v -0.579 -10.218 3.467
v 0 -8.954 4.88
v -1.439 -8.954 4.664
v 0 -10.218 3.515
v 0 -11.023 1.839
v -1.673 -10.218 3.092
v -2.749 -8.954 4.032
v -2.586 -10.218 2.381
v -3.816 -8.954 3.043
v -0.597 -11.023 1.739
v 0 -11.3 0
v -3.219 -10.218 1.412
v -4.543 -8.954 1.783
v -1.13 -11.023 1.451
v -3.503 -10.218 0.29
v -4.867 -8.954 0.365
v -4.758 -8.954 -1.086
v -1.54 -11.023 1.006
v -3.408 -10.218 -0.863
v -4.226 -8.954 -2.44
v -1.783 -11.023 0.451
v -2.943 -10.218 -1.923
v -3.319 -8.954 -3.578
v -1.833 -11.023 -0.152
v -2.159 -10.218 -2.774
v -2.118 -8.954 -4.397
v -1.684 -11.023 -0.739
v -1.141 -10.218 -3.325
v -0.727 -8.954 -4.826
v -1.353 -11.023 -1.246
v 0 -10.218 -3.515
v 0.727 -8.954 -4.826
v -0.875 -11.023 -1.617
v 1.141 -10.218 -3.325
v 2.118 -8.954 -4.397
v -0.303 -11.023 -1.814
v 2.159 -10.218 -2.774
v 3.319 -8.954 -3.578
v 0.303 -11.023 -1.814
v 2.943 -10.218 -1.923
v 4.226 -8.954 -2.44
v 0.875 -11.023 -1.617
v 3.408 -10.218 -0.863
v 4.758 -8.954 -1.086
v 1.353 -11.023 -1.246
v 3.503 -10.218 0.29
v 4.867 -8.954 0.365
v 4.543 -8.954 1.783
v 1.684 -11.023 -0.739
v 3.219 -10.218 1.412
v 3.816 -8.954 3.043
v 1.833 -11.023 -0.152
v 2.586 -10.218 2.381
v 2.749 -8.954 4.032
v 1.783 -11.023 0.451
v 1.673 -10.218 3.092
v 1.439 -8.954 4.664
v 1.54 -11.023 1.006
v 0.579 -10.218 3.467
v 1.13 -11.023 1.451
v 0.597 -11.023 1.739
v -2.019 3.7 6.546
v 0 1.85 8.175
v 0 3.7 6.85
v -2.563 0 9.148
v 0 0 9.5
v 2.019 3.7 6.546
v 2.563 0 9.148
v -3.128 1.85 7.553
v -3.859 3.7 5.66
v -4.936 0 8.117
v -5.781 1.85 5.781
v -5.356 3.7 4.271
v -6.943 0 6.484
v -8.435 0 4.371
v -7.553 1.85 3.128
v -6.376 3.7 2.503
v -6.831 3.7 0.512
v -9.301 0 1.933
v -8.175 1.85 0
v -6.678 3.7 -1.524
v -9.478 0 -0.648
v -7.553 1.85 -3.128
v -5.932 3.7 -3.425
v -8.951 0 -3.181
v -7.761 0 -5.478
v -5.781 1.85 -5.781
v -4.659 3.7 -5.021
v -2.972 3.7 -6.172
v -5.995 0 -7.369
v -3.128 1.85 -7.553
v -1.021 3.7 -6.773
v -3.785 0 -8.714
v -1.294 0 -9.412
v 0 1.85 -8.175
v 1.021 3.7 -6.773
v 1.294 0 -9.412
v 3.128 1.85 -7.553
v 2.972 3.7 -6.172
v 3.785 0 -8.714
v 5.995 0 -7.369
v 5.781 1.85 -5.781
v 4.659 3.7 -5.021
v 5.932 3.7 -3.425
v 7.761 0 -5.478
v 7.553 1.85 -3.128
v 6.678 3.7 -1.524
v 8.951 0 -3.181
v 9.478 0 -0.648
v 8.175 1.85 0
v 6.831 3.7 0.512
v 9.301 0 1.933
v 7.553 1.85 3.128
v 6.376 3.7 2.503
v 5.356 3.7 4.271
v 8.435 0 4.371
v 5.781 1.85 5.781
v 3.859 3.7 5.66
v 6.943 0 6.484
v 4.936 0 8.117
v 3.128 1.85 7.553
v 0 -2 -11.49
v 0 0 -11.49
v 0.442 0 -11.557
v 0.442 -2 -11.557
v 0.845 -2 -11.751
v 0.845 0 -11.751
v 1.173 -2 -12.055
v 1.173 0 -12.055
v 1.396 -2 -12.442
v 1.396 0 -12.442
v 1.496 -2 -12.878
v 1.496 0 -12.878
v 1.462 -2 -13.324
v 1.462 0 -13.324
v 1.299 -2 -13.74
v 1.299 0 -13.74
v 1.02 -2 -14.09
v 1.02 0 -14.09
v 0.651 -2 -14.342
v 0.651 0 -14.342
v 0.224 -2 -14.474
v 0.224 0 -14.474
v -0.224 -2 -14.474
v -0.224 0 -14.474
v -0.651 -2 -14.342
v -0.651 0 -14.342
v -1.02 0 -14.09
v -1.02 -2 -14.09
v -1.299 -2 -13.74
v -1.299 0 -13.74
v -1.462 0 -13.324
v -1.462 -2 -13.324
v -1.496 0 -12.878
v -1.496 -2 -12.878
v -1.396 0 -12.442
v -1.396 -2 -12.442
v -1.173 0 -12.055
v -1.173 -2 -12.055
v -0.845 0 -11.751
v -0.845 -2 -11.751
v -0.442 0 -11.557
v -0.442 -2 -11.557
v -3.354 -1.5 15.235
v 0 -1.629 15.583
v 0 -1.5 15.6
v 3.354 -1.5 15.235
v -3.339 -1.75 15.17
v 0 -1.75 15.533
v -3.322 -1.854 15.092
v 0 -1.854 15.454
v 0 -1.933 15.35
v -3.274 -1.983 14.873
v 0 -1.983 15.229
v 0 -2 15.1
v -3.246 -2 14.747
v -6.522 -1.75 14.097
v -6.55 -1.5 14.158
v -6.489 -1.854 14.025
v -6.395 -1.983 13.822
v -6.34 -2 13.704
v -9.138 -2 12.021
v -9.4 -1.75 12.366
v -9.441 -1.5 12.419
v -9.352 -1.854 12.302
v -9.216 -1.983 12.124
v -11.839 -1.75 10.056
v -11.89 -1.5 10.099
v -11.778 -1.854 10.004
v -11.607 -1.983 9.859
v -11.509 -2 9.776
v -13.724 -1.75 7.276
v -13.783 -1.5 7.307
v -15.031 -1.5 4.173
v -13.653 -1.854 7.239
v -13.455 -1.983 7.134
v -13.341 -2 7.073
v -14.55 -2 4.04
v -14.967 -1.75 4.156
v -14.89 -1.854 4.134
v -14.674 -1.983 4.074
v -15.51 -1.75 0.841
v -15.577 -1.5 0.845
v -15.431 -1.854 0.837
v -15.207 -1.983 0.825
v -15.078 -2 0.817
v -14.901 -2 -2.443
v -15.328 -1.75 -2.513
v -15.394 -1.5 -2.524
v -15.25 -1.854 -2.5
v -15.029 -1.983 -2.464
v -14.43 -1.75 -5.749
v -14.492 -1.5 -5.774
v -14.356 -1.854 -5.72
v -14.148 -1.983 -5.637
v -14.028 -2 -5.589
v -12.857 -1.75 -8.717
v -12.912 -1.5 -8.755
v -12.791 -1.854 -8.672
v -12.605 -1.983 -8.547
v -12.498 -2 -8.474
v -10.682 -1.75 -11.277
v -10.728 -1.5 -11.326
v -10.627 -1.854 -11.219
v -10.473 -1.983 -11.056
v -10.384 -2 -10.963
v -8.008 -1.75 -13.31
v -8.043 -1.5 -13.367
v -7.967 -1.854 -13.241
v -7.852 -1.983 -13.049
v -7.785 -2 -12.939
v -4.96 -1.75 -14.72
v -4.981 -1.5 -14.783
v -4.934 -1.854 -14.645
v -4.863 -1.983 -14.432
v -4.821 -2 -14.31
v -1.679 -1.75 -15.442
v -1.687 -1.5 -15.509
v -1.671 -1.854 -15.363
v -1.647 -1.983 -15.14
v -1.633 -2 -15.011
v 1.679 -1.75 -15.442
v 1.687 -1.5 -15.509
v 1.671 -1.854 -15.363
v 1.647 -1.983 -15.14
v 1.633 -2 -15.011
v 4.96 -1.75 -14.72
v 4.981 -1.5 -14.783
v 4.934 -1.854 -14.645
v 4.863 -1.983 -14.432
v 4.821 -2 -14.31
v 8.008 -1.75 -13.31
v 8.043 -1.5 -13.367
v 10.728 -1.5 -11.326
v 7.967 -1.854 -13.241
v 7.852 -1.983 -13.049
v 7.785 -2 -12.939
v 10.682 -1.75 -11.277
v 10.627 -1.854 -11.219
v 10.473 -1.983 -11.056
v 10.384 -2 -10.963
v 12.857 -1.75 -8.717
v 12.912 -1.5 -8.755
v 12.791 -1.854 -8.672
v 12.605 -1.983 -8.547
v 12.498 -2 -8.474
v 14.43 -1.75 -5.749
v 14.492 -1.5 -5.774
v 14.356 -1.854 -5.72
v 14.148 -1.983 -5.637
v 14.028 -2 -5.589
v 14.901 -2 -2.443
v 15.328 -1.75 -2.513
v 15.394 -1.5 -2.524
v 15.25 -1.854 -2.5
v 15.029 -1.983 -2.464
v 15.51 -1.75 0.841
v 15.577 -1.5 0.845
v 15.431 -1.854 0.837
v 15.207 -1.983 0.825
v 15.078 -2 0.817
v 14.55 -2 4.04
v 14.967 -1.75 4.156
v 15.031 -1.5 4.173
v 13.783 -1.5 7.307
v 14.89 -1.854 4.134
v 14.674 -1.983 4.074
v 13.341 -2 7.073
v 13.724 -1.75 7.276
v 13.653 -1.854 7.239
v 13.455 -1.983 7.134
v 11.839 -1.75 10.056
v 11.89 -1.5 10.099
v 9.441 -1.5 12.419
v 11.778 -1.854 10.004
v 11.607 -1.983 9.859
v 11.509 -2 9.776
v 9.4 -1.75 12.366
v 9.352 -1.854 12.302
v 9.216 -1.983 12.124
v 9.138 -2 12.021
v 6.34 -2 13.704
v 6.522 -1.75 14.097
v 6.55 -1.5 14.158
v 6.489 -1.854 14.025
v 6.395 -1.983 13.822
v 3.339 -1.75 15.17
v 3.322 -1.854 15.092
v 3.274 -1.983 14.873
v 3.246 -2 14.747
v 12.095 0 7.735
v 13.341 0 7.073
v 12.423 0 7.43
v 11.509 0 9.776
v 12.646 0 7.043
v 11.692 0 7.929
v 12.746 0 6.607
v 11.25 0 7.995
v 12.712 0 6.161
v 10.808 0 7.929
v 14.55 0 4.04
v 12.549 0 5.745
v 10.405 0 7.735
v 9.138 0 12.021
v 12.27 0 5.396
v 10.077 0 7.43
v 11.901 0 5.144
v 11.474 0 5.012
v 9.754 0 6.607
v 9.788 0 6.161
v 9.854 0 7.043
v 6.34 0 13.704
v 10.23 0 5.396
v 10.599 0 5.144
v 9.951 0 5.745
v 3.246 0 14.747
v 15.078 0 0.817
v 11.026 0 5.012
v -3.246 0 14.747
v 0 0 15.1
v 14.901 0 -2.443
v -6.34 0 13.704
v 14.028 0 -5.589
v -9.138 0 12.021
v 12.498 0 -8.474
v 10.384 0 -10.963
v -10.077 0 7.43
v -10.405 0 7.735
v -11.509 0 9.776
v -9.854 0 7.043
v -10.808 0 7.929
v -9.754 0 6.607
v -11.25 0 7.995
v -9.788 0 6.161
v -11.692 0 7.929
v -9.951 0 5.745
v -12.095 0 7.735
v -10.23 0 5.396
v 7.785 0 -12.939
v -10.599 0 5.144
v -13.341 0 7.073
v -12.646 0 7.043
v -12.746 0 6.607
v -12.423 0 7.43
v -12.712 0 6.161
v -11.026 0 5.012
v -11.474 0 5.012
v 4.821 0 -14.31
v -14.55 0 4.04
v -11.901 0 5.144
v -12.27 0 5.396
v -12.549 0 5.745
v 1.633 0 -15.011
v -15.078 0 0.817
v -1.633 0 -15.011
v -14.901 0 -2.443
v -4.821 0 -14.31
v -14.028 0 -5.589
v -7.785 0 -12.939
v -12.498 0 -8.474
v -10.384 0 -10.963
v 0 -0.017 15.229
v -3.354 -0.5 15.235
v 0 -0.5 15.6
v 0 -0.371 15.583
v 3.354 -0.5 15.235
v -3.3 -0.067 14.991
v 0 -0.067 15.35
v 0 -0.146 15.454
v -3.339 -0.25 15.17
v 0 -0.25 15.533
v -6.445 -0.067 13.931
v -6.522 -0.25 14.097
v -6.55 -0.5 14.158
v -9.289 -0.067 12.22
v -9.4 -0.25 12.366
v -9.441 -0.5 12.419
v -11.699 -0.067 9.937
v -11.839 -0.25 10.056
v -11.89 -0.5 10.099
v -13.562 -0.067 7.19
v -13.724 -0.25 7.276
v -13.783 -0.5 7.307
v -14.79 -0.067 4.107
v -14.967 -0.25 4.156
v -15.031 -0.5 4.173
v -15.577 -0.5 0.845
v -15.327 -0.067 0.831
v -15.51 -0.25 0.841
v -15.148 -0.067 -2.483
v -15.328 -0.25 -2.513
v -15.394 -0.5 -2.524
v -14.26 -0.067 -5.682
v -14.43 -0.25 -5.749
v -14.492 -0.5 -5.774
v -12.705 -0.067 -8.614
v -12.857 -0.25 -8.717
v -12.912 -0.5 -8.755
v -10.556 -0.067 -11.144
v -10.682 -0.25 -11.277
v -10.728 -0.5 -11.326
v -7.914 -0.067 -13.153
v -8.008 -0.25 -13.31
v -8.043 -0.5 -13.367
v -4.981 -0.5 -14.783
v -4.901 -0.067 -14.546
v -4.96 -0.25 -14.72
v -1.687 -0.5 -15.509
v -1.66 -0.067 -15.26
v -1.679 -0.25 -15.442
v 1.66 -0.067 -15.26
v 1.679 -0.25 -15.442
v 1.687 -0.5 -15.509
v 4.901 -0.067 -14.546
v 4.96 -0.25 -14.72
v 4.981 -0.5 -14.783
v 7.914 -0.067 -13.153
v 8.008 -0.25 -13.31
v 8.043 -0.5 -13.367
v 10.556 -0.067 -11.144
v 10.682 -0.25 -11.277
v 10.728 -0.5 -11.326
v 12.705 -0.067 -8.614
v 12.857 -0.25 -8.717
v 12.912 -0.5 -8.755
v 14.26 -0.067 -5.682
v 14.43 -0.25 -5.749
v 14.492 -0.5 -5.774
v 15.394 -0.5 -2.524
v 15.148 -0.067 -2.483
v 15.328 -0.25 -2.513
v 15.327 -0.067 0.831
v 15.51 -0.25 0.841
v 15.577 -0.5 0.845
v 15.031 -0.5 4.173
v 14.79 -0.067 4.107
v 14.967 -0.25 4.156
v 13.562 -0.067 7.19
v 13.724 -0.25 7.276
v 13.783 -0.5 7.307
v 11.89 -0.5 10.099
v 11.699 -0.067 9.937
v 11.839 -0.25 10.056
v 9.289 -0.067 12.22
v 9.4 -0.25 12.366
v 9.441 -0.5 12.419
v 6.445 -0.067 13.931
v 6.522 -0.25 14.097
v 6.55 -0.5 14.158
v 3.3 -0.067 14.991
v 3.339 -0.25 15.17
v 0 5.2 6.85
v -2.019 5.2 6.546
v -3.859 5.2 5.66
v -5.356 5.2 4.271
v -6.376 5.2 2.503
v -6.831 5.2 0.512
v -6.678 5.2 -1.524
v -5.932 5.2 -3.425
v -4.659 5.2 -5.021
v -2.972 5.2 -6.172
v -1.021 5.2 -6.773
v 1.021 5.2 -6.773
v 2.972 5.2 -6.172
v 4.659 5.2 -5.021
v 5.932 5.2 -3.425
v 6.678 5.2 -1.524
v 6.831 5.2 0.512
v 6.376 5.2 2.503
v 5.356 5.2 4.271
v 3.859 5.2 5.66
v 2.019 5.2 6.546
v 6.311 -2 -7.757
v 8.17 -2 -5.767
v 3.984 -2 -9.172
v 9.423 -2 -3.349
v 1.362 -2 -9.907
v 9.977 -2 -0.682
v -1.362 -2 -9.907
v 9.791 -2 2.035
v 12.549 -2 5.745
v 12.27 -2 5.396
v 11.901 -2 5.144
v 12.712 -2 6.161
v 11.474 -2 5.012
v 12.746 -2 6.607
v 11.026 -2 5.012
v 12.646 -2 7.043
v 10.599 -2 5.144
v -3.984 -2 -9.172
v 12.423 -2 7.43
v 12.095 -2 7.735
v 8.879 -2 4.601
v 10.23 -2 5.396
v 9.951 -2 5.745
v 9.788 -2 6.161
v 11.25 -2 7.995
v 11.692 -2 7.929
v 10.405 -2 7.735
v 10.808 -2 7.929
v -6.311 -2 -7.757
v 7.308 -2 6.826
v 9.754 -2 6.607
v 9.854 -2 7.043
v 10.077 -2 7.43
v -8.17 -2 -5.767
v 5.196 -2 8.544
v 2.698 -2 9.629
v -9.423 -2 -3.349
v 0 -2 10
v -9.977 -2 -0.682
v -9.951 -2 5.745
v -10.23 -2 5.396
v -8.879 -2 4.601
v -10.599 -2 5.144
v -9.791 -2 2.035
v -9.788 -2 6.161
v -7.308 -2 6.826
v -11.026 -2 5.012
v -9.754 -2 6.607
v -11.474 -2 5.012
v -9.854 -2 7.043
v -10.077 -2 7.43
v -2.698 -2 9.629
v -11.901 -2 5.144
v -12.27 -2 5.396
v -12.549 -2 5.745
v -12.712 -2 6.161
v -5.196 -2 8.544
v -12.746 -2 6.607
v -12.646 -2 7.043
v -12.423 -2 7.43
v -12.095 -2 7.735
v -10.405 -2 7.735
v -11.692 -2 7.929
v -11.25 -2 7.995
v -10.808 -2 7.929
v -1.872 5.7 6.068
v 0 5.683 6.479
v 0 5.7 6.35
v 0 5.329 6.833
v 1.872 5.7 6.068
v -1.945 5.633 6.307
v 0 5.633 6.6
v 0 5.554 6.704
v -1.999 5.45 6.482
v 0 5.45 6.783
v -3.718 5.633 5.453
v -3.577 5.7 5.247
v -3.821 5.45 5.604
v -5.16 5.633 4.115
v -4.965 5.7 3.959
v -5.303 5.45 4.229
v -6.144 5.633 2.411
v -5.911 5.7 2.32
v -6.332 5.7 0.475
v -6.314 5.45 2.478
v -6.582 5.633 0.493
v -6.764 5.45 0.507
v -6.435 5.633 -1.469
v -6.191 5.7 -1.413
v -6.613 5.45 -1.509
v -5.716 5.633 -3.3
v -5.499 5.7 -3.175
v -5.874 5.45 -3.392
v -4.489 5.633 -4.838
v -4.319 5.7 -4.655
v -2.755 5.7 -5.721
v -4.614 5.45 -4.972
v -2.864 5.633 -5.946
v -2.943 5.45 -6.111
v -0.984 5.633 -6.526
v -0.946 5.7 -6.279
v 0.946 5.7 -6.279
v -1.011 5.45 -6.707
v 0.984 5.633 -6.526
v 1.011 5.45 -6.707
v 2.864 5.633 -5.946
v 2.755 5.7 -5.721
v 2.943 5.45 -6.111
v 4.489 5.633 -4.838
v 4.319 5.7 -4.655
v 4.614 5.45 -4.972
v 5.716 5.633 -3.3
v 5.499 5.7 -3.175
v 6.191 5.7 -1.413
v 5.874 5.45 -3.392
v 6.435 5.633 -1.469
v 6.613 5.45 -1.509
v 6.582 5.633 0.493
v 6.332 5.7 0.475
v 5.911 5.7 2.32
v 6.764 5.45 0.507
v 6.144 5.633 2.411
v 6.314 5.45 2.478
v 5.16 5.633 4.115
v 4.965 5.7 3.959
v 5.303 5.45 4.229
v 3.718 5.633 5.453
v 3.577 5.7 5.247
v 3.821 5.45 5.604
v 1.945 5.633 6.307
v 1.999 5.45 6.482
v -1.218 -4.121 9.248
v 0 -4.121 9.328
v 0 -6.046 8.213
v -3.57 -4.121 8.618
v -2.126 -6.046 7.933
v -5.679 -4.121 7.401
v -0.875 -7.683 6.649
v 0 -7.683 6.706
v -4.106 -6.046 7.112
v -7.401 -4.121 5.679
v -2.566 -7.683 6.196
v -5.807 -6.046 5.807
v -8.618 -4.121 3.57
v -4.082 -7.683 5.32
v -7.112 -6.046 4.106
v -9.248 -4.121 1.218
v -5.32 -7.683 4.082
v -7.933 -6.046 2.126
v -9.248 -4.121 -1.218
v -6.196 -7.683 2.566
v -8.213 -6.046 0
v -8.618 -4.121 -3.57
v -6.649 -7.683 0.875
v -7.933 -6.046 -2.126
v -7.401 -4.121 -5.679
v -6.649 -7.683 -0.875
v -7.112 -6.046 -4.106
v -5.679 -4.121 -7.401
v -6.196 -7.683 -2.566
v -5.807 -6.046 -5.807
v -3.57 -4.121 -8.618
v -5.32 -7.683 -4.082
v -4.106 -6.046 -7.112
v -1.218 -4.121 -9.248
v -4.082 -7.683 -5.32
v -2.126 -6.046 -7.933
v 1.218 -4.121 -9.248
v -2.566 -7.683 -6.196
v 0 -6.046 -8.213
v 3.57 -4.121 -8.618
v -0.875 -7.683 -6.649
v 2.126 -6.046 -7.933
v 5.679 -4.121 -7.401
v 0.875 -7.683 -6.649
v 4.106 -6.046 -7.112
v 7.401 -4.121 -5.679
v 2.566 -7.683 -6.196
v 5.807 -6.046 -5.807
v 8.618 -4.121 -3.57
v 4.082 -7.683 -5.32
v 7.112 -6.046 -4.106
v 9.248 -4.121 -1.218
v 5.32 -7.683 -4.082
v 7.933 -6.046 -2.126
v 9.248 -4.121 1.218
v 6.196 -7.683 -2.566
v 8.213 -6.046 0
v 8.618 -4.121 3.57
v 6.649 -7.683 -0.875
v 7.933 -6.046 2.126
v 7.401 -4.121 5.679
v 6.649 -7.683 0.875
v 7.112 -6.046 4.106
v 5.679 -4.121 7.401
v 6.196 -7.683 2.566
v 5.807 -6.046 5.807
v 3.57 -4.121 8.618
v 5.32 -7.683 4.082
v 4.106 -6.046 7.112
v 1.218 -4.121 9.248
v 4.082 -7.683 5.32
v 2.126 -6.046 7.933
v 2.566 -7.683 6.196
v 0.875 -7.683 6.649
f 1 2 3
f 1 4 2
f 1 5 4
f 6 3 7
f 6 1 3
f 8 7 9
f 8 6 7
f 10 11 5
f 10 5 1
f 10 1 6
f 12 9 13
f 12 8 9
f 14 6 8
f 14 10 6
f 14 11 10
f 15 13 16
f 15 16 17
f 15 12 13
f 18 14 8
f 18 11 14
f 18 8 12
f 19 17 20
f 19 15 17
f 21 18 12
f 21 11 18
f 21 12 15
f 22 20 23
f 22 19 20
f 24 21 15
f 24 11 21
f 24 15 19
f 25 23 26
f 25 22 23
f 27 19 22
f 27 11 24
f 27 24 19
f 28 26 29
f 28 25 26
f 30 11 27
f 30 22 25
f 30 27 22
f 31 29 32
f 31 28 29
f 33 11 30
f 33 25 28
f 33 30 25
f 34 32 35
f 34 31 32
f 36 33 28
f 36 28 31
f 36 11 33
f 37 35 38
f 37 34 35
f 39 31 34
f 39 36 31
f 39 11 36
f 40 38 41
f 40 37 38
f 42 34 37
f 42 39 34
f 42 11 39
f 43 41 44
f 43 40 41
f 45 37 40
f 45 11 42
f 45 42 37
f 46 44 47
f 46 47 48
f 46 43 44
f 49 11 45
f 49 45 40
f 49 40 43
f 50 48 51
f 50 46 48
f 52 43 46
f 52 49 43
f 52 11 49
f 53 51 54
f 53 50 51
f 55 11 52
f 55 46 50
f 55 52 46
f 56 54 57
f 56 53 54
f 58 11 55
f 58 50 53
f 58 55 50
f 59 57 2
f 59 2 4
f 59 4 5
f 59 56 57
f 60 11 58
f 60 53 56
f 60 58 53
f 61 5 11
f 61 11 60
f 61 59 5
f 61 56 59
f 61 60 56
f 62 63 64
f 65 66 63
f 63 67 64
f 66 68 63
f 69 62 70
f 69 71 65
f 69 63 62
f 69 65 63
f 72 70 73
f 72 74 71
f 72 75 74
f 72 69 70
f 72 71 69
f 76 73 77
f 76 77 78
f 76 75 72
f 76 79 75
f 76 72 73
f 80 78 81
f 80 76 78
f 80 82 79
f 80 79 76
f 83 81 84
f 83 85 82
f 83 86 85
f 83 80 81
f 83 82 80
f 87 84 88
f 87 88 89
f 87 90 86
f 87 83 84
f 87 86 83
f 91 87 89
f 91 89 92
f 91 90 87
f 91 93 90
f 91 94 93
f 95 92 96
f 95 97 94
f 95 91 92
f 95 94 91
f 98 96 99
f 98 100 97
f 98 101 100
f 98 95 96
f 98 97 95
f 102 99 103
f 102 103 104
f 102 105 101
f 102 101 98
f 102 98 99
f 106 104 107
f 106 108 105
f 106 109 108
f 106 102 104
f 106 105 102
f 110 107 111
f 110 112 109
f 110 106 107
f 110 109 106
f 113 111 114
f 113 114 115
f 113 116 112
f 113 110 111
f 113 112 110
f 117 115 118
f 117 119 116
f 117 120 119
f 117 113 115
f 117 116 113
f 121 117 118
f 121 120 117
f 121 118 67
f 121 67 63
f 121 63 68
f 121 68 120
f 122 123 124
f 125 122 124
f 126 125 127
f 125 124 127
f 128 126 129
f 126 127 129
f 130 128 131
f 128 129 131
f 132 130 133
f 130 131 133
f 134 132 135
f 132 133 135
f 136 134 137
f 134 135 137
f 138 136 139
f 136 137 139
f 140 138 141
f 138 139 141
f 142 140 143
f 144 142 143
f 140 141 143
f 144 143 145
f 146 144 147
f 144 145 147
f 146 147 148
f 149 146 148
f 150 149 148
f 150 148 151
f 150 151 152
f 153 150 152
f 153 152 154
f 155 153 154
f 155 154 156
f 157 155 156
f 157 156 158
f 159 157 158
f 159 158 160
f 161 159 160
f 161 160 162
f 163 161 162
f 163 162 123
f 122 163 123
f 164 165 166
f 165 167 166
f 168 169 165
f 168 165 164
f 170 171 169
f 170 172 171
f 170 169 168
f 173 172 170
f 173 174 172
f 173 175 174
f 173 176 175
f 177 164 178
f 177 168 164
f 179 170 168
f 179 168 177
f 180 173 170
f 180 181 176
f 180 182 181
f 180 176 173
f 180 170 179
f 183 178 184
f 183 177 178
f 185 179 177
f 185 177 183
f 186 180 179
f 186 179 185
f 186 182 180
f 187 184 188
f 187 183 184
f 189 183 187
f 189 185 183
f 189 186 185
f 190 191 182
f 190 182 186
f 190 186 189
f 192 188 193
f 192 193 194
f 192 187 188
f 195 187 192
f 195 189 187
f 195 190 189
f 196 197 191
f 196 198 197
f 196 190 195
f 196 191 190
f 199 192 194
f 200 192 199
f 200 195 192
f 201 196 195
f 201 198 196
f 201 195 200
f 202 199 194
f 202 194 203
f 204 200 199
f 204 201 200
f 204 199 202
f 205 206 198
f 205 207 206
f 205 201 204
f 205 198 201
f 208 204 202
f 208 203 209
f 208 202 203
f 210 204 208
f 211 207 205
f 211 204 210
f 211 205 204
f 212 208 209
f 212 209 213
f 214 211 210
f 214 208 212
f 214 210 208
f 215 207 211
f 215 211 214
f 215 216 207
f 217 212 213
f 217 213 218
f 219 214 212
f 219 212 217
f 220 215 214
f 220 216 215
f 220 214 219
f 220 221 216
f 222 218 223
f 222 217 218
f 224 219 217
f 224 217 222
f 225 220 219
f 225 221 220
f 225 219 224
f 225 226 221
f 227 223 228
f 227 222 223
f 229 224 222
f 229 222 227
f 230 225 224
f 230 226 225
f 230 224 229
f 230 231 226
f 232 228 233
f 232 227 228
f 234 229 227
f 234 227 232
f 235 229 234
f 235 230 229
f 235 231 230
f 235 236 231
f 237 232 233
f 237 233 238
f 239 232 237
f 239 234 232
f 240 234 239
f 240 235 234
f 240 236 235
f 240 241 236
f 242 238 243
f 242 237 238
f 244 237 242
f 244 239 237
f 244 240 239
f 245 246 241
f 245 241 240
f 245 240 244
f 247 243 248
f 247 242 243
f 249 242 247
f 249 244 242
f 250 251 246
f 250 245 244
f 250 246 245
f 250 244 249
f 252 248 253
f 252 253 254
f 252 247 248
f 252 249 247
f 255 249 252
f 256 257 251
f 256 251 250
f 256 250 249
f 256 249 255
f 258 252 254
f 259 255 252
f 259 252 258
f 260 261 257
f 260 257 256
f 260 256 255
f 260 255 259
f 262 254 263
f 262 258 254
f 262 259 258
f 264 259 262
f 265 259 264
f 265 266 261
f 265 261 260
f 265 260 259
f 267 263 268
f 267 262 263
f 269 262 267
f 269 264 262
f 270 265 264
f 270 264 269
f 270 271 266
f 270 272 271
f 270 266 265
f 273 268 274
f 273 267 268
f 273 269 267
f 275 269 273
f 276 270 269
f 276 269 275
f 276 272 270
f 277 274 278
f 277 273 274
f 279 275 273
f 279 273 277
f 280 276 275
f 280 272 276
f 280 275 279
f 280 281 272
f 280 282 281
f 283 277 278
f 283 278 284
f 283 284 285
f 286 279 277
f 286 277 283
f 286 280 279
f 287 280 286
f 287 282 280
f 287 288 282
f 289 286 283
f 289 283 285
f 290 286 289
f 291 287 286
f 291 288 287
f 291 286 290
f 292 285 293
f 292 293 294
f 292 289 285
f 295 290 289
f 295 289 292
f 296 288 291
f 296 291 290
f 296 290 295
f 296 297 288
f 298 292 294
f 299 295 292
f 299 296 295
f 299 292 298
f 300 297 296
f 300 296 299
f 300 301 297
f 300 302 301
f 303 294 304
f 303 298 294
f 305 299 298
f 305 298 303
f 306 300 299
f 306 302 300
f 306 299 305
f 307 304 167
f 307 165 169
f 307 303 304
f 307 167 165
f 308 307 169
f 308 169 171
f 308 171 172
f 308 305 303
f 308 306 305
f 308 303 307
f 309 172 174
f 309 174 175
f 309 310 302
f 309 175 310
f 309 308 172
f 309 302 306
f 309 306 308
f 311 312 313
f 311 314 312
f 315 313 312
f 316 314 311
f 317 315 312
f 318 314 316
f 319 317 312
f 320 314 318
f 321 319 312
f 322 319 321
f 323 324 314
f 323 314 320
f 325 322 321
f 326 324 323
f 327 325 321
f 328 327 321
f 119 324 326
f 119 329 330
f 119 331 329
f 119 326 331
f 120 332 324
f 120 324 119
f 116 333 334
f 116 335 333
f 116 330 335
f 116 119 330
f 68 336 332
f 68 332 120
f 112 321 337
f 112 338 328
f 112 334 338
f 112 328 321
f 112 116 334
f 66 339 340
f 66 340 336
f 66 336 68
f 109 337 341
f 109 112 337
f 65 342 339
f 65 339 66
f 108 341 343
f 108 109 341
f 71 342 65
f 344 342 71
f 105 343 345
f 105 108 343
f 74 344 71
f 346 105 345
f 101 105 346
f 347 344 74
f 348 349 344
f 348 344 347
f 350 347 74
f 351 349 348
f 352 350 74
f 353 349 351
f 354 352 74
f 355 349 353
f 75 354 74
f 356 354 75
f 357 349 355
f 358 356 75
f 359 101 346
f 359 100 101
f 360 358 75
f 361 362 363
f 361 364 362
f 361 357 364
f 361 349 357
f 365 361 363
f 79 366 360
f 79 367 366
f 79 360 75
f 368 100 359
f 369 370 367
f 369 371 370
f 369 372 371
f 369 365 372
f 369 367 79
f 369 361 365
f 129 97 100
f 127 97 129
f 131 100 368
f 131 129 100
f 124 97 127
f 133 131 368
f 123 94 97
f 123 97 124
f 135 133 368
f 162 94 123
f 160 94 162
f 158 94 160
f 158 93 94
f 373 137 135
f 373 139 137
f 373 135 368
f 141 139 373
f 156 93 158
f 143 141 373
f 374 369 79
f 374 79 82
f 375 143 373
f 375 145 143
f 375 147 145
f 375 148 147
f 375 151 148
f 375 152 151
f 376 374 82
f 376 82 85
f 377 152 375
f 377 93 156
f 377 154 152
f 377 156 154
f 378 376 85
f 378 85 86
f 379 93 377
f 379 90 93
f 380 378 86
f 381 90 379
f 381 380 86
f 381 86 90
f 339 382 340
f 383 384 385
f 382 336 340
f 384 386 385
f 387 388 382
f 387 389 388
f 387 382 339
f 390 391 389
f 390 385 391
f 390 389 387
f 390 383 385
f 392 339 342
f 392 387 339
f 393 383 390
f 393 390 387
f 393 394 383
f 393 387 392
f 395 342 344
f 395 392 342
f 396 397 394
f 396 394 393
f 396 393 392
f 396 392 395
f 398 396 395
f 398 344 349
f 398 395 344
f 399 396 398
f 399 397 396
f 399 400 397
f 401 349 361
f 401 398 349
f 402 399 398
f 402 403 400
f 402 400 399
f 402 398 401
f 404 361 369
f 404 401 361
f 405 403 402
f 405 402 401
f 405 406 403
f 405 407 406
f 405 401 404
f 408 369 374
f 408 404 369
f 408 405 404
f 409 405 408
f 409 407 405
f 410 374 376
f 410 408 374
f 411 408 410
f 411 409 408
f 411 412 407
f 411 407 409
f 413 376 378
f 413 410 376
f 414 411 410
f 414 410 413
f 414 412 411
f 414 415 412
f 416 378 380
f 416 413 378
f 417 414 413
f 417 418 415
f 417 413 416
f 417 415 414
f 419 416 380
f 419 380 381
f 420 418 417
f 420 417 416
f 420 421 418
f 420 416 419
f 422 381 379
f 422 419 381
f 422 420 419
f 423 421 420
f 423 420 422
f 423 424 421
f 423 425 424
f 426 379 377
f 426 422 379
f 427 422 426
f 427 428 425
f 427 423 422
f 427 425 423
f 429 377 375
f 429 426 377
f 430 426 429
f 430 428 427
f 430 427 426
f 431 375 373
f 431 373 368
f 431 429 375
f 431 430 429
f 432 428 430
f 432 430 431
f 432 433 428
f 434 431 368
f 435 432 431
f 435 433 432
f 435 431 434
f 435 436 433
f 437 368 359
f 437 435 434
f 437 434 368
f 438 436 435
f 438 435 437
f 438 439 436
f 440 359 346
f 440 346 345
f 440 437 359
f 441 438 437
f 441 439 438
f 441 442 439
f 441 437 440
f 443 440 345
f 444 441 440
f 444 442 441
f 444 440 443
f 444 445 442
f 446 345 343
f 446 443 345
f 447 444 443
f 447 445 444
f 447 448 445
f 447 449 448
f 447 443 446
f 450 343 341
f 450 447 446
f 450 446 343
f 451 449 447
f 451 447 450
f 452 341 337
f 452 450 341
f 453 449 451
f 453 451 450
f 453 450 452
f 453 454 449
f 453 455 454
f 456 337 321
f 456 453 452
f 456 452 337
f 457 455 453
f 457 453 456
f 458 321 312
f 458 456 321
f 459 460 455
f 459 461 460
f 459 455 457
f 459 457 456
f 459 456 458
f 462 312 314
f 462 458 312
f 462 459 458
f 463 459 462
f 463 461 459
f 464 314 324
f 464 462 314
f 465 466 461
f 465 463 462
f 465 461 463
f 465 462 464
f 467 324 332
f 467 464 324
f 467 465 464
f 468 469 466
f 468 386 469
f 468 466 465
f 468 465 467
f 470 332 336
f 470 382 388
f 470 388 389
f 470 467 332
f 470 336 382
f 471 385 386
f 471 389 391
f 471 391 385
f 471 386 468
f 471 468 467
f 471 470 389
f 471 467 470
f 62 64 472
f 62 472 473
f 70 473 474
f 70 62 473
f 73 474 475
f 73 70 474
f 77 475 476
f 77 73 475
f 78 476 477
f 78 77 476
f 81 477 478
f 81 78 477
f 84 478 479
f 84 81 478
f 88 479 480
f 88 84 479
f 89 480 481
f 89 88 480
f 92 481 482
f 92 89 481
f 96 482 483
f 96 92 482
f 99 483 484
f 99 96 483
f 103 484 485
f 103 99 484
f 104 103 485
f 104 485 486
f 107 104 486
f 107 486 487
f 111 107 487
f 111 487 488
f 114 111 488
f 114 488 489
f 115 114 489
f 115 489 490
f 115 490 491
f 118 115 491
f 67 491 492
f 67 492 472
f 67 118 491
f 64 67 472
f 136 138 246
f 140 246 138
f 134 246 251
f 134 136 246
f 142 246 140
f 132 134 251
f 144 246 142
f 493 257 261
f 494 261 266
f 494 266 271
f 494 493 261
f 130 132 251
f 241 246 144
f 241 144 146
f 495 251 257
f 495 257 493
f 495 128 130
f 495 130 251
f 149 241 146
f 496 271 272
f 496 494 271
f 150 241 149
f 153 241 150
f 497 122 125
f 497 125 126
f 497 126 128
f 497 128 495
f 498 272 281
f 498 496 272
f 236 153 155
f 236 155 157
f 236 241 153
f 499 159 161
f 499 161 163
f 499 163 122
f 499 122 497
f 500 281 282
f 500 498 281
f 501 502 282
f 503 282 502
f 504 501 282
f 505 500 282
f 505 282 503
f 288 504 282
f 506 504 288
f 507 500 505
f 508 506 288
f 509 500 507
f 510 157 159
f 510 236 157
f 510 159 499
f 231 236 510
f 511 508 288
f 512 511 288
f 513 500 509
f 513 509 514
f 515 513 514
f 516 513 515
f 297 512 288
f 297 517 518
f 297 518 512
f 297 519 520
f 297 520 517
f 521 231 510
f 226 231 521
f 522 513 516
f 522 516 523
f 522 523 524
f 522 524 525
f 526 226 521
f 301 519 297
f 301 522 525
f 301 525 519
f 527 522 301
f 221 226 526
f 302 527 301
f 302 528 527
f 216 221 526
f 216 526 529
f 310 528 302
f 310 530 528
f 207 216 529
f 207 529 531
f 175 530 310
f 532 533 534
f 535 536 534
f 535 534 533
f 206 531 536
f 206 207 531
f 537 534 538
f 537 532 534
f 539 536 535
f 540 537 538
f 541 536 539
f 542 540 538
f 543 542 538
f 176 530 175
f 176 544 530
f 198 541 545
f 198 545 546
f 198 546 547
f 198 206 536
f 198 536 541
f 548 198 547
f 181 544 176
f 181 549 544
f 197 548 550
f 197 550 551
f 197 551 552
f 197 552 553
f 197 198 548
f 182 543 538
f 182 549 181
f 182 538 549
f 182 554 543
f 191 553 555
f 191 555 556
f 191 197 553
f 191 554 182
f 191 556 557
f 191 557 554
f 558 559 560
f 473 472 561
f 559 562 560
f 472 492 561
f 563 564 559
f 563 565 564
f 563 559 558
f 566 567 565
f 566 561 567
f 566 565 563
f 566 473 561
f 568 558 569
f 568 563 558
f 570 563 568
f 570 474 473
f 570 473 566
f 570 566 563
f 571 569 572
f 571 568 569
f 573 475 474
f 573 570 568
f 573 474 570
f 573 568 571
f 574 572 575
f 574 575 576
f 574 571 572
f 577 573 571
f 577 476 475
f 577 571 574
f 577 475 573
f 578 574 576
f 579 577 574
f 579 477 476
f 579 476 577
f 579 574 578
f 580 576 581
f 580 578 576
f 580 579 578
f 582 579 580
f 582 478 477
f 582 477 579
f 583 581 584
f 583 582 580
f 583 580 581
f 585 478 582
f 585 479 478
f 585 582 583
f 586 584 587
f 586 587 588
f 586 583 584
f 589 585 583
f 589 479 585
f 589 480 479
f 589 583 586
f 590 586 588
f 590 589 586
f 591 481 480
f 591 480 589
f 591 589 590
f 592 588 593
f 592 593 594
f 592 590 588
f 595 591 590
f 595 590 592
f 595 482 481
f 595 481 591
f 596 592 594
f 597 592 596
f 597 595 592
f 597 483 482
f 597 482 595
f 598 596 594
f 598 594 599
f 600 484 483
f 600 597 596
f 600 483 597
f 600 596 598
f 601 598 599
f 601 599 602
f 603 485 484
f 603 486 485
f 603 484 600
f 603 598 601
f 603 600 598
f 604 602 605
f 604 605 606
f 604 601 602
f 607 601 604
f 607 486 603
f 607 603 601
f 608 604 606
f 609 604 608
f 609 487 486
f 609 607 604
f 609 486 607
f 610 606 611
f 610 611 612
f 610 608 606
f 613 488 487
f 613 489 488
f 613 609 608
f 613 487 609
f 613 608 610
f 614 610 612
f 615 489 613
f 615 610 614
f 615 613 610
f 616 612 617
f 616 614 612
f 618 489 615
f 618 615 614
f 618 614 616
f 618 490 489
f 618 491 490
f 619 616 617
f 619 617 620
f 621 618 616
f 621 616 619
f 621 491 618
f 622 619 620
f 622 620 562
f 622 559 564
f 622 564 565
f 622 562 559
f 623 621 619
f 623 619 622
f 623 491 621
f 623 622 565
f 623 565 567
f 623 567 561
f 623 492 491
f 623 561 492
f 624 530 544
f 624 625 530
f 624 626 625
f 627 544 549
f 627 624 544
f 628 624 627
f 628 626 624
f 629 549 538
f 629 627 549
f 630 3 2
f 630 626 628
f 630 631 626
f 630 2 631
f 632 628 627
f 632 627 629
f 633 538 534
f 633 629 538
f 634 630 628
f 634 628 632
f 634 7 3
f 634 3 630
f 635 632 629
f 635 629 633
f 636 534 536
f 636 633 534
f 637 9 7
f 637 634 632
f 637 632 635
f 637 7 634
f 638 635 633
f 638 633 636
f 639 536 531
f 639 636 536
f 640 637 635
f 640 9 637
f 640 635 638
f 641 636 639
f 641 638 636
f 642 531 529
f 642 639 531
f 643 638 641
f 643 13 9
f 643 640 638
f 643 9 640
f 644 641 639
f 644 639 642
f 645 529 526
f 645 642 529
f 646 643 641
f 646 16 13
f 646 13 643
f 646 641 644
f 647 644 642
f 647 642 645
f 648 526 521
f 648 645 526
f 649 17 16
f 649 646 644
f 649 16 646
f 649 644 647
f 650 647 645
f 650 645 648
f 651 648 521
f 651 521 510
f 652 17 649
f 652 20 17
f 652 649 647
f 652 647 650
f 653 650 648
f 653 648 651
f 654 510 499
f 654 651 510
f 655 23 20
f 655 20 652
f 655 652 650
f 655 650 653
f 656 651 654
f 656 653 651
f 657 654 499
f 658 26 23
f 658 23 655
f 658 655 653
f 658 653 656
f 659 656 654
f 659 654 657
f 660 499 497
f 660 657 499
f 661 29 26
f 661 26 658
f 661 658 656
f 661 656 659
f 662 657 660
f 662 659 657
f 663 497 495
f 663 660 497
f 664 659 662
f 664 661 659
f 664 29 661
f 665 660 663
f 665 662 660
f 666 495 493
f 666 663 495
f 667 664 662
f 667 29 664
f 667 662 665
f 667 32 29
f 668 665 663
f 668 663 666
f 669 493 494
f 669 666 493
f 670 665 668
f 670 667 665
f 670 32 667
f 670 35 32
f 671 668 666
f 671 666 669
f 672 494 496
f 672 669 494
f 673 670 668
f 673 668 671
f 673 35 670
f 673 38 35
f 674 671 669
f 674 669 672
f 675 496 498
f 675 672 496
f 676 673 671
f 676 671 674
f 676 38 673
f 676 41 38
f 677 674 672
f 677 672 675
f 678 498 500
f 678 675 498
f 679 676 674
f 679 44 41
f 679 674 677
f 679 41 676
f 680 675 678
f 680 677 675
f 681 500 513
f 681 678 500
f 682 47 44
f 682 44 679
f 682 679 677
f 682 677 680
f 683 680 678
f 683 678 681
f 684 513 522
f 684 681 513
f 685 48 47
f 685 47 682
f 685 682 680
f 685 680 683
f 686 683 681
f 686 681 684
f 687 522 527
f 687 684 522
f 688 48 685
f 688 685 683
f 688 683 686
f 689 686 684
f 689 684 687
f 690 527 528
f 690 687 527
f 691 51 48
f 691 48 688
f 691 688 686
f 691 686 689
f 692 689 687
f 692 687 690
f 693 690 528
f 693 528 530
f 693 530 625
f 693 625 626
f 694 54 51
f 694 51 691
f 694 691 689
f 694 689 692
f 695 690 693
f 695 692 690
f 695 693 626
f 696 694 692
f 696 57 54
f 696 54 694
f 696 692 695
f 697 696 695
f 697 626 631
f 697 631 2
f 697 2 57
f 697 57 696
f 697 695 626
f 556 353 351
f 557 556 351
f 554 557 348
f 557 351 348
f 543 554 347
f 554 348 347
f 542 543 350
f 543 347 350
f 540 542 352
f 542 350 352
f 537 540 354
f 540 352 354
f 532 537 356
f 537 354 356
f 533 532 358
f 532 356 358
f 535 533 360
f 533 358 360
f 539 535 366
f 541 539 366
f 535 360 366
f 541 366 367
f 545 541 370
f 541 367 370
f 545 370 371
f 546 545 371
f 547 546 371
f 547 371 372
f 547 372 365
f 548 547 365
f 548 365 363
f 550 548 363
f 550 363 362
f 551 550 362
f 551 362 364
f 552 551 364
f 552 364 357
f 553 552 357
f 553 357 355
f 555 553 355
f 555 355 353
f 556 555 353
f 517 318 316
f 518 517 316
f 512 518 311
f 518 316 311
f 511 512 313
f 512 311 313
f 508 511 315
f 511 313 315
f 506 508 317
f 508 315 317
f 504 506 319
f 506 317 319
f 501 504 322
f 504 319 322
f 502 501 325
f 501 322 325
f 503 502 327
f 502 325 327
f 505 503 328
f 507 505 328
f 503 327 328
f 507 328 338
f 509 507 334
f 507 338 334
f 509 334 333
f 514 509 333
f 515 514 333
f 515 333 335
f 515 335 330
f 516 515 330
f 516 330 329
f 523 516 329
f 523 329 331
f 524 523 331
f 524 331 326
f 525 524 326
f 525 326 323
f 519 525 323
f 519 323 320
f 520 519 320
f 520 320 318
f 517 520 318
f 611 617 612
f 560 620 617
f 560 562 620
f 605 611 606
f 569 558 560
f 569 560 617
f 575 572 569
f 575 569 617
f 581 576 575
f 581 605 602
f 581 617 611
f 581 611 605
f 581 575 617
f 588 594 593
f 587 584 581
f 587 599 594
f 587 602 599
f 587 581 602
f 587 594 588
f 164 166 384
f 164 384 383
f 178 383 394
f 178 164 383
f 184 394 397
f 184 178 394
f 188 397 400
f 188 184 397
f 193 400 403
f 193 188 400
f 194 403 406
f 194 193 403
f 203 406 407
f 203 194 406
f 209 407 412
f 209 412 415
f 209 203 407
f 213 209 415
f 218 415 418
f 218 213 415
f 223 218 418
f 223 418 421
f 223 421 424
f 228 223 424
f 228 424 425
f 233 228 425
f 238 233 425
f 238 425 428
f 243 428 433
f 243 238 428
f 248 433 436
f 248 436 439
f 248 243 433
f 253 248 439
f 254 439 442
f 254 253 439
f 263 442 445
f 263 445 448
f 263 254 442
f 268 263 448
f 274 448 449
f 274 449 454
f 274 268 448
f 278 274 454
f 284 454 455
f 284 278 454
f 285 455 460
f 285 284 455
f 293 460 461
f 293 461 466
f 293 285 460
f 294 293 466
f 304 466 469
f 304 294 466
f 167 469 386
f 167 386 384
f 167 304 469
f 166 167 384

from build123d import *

# Parameters (mm, degrees)
CONG_1_R                = 0.5
ESQUISSE2_R             = 1.5
ENL_V_MAT_EXTRU_1_DEPTH = 10


with BuildPart() as part:
    # Esquisse1 → Révolution1 (revolve)
    with BuildSketch(Plane.XY, mode=Mode.PRIVATE) as r_volution1_sk:
        with BuildLine():
            Line((0, 5.7), (6.85, 5.7))
            Line((6.85, 5.7), (6.85, 3.7))
            Line((6.85, 3.7), (9.5, 0))
            Line((9.5, 0), (15.6, 0))
            Line((15.6, 0), (15.6, -2))
            Line((15.6, -2), (10, -2))
            ThreePointArc((10, -2), (8.212627426, -6.045887094), (4.880340938, -8.954455446))
            ThreePointArc((4.880340938, -8.954455446), (2.707365275, -10.683176126), (0, -11.3))
            Line((0, -11.3), (0, 5.7))
        make_face()
    revolve(r_volution1_sk.sketch.rotate(Axis((0, 5.7, 0), (0, -1, 0)), 90), axis=Axis((0, 5.7, 0), (0, -1, 0)))

    # Congé1
    cong_1_edges = [part.edges().sort_by_distance(p)[0] for p in [
        (0, 5.7, -6.85),
        (0, 0, -15.6),
        (0, -2, -15.6),
    ]]
    fillet(cong_1_edges, radius=CONG_1_R)

    # Esquisse2 → Enlèv. mat.-Extru.1 (cut)
    with BuildSketch(Plane(origin=(0, 0, 0), x_dir=(1, 0, 0), z_dir=(0, 1, 0))):
        with Locations(Location((0, 12.990381057, 0), (0, 0, 270))):
            Circle(ESQUISSE2_R)
        with Locations(Location((11.25, -6.495190528, 0), (0, 0, 270))):
            Circle(ESQUISSE2_R)
        with Locations(Location((-11.25, -6.495190528, 0), (0, 0, 270))):
            Circle(ESQUISSE2_R)
    extrude(amount=-ENL_V_MAT_EXTRU_1_DEPTH, mode=Mode.SUBTRACT)


solid = part.part
